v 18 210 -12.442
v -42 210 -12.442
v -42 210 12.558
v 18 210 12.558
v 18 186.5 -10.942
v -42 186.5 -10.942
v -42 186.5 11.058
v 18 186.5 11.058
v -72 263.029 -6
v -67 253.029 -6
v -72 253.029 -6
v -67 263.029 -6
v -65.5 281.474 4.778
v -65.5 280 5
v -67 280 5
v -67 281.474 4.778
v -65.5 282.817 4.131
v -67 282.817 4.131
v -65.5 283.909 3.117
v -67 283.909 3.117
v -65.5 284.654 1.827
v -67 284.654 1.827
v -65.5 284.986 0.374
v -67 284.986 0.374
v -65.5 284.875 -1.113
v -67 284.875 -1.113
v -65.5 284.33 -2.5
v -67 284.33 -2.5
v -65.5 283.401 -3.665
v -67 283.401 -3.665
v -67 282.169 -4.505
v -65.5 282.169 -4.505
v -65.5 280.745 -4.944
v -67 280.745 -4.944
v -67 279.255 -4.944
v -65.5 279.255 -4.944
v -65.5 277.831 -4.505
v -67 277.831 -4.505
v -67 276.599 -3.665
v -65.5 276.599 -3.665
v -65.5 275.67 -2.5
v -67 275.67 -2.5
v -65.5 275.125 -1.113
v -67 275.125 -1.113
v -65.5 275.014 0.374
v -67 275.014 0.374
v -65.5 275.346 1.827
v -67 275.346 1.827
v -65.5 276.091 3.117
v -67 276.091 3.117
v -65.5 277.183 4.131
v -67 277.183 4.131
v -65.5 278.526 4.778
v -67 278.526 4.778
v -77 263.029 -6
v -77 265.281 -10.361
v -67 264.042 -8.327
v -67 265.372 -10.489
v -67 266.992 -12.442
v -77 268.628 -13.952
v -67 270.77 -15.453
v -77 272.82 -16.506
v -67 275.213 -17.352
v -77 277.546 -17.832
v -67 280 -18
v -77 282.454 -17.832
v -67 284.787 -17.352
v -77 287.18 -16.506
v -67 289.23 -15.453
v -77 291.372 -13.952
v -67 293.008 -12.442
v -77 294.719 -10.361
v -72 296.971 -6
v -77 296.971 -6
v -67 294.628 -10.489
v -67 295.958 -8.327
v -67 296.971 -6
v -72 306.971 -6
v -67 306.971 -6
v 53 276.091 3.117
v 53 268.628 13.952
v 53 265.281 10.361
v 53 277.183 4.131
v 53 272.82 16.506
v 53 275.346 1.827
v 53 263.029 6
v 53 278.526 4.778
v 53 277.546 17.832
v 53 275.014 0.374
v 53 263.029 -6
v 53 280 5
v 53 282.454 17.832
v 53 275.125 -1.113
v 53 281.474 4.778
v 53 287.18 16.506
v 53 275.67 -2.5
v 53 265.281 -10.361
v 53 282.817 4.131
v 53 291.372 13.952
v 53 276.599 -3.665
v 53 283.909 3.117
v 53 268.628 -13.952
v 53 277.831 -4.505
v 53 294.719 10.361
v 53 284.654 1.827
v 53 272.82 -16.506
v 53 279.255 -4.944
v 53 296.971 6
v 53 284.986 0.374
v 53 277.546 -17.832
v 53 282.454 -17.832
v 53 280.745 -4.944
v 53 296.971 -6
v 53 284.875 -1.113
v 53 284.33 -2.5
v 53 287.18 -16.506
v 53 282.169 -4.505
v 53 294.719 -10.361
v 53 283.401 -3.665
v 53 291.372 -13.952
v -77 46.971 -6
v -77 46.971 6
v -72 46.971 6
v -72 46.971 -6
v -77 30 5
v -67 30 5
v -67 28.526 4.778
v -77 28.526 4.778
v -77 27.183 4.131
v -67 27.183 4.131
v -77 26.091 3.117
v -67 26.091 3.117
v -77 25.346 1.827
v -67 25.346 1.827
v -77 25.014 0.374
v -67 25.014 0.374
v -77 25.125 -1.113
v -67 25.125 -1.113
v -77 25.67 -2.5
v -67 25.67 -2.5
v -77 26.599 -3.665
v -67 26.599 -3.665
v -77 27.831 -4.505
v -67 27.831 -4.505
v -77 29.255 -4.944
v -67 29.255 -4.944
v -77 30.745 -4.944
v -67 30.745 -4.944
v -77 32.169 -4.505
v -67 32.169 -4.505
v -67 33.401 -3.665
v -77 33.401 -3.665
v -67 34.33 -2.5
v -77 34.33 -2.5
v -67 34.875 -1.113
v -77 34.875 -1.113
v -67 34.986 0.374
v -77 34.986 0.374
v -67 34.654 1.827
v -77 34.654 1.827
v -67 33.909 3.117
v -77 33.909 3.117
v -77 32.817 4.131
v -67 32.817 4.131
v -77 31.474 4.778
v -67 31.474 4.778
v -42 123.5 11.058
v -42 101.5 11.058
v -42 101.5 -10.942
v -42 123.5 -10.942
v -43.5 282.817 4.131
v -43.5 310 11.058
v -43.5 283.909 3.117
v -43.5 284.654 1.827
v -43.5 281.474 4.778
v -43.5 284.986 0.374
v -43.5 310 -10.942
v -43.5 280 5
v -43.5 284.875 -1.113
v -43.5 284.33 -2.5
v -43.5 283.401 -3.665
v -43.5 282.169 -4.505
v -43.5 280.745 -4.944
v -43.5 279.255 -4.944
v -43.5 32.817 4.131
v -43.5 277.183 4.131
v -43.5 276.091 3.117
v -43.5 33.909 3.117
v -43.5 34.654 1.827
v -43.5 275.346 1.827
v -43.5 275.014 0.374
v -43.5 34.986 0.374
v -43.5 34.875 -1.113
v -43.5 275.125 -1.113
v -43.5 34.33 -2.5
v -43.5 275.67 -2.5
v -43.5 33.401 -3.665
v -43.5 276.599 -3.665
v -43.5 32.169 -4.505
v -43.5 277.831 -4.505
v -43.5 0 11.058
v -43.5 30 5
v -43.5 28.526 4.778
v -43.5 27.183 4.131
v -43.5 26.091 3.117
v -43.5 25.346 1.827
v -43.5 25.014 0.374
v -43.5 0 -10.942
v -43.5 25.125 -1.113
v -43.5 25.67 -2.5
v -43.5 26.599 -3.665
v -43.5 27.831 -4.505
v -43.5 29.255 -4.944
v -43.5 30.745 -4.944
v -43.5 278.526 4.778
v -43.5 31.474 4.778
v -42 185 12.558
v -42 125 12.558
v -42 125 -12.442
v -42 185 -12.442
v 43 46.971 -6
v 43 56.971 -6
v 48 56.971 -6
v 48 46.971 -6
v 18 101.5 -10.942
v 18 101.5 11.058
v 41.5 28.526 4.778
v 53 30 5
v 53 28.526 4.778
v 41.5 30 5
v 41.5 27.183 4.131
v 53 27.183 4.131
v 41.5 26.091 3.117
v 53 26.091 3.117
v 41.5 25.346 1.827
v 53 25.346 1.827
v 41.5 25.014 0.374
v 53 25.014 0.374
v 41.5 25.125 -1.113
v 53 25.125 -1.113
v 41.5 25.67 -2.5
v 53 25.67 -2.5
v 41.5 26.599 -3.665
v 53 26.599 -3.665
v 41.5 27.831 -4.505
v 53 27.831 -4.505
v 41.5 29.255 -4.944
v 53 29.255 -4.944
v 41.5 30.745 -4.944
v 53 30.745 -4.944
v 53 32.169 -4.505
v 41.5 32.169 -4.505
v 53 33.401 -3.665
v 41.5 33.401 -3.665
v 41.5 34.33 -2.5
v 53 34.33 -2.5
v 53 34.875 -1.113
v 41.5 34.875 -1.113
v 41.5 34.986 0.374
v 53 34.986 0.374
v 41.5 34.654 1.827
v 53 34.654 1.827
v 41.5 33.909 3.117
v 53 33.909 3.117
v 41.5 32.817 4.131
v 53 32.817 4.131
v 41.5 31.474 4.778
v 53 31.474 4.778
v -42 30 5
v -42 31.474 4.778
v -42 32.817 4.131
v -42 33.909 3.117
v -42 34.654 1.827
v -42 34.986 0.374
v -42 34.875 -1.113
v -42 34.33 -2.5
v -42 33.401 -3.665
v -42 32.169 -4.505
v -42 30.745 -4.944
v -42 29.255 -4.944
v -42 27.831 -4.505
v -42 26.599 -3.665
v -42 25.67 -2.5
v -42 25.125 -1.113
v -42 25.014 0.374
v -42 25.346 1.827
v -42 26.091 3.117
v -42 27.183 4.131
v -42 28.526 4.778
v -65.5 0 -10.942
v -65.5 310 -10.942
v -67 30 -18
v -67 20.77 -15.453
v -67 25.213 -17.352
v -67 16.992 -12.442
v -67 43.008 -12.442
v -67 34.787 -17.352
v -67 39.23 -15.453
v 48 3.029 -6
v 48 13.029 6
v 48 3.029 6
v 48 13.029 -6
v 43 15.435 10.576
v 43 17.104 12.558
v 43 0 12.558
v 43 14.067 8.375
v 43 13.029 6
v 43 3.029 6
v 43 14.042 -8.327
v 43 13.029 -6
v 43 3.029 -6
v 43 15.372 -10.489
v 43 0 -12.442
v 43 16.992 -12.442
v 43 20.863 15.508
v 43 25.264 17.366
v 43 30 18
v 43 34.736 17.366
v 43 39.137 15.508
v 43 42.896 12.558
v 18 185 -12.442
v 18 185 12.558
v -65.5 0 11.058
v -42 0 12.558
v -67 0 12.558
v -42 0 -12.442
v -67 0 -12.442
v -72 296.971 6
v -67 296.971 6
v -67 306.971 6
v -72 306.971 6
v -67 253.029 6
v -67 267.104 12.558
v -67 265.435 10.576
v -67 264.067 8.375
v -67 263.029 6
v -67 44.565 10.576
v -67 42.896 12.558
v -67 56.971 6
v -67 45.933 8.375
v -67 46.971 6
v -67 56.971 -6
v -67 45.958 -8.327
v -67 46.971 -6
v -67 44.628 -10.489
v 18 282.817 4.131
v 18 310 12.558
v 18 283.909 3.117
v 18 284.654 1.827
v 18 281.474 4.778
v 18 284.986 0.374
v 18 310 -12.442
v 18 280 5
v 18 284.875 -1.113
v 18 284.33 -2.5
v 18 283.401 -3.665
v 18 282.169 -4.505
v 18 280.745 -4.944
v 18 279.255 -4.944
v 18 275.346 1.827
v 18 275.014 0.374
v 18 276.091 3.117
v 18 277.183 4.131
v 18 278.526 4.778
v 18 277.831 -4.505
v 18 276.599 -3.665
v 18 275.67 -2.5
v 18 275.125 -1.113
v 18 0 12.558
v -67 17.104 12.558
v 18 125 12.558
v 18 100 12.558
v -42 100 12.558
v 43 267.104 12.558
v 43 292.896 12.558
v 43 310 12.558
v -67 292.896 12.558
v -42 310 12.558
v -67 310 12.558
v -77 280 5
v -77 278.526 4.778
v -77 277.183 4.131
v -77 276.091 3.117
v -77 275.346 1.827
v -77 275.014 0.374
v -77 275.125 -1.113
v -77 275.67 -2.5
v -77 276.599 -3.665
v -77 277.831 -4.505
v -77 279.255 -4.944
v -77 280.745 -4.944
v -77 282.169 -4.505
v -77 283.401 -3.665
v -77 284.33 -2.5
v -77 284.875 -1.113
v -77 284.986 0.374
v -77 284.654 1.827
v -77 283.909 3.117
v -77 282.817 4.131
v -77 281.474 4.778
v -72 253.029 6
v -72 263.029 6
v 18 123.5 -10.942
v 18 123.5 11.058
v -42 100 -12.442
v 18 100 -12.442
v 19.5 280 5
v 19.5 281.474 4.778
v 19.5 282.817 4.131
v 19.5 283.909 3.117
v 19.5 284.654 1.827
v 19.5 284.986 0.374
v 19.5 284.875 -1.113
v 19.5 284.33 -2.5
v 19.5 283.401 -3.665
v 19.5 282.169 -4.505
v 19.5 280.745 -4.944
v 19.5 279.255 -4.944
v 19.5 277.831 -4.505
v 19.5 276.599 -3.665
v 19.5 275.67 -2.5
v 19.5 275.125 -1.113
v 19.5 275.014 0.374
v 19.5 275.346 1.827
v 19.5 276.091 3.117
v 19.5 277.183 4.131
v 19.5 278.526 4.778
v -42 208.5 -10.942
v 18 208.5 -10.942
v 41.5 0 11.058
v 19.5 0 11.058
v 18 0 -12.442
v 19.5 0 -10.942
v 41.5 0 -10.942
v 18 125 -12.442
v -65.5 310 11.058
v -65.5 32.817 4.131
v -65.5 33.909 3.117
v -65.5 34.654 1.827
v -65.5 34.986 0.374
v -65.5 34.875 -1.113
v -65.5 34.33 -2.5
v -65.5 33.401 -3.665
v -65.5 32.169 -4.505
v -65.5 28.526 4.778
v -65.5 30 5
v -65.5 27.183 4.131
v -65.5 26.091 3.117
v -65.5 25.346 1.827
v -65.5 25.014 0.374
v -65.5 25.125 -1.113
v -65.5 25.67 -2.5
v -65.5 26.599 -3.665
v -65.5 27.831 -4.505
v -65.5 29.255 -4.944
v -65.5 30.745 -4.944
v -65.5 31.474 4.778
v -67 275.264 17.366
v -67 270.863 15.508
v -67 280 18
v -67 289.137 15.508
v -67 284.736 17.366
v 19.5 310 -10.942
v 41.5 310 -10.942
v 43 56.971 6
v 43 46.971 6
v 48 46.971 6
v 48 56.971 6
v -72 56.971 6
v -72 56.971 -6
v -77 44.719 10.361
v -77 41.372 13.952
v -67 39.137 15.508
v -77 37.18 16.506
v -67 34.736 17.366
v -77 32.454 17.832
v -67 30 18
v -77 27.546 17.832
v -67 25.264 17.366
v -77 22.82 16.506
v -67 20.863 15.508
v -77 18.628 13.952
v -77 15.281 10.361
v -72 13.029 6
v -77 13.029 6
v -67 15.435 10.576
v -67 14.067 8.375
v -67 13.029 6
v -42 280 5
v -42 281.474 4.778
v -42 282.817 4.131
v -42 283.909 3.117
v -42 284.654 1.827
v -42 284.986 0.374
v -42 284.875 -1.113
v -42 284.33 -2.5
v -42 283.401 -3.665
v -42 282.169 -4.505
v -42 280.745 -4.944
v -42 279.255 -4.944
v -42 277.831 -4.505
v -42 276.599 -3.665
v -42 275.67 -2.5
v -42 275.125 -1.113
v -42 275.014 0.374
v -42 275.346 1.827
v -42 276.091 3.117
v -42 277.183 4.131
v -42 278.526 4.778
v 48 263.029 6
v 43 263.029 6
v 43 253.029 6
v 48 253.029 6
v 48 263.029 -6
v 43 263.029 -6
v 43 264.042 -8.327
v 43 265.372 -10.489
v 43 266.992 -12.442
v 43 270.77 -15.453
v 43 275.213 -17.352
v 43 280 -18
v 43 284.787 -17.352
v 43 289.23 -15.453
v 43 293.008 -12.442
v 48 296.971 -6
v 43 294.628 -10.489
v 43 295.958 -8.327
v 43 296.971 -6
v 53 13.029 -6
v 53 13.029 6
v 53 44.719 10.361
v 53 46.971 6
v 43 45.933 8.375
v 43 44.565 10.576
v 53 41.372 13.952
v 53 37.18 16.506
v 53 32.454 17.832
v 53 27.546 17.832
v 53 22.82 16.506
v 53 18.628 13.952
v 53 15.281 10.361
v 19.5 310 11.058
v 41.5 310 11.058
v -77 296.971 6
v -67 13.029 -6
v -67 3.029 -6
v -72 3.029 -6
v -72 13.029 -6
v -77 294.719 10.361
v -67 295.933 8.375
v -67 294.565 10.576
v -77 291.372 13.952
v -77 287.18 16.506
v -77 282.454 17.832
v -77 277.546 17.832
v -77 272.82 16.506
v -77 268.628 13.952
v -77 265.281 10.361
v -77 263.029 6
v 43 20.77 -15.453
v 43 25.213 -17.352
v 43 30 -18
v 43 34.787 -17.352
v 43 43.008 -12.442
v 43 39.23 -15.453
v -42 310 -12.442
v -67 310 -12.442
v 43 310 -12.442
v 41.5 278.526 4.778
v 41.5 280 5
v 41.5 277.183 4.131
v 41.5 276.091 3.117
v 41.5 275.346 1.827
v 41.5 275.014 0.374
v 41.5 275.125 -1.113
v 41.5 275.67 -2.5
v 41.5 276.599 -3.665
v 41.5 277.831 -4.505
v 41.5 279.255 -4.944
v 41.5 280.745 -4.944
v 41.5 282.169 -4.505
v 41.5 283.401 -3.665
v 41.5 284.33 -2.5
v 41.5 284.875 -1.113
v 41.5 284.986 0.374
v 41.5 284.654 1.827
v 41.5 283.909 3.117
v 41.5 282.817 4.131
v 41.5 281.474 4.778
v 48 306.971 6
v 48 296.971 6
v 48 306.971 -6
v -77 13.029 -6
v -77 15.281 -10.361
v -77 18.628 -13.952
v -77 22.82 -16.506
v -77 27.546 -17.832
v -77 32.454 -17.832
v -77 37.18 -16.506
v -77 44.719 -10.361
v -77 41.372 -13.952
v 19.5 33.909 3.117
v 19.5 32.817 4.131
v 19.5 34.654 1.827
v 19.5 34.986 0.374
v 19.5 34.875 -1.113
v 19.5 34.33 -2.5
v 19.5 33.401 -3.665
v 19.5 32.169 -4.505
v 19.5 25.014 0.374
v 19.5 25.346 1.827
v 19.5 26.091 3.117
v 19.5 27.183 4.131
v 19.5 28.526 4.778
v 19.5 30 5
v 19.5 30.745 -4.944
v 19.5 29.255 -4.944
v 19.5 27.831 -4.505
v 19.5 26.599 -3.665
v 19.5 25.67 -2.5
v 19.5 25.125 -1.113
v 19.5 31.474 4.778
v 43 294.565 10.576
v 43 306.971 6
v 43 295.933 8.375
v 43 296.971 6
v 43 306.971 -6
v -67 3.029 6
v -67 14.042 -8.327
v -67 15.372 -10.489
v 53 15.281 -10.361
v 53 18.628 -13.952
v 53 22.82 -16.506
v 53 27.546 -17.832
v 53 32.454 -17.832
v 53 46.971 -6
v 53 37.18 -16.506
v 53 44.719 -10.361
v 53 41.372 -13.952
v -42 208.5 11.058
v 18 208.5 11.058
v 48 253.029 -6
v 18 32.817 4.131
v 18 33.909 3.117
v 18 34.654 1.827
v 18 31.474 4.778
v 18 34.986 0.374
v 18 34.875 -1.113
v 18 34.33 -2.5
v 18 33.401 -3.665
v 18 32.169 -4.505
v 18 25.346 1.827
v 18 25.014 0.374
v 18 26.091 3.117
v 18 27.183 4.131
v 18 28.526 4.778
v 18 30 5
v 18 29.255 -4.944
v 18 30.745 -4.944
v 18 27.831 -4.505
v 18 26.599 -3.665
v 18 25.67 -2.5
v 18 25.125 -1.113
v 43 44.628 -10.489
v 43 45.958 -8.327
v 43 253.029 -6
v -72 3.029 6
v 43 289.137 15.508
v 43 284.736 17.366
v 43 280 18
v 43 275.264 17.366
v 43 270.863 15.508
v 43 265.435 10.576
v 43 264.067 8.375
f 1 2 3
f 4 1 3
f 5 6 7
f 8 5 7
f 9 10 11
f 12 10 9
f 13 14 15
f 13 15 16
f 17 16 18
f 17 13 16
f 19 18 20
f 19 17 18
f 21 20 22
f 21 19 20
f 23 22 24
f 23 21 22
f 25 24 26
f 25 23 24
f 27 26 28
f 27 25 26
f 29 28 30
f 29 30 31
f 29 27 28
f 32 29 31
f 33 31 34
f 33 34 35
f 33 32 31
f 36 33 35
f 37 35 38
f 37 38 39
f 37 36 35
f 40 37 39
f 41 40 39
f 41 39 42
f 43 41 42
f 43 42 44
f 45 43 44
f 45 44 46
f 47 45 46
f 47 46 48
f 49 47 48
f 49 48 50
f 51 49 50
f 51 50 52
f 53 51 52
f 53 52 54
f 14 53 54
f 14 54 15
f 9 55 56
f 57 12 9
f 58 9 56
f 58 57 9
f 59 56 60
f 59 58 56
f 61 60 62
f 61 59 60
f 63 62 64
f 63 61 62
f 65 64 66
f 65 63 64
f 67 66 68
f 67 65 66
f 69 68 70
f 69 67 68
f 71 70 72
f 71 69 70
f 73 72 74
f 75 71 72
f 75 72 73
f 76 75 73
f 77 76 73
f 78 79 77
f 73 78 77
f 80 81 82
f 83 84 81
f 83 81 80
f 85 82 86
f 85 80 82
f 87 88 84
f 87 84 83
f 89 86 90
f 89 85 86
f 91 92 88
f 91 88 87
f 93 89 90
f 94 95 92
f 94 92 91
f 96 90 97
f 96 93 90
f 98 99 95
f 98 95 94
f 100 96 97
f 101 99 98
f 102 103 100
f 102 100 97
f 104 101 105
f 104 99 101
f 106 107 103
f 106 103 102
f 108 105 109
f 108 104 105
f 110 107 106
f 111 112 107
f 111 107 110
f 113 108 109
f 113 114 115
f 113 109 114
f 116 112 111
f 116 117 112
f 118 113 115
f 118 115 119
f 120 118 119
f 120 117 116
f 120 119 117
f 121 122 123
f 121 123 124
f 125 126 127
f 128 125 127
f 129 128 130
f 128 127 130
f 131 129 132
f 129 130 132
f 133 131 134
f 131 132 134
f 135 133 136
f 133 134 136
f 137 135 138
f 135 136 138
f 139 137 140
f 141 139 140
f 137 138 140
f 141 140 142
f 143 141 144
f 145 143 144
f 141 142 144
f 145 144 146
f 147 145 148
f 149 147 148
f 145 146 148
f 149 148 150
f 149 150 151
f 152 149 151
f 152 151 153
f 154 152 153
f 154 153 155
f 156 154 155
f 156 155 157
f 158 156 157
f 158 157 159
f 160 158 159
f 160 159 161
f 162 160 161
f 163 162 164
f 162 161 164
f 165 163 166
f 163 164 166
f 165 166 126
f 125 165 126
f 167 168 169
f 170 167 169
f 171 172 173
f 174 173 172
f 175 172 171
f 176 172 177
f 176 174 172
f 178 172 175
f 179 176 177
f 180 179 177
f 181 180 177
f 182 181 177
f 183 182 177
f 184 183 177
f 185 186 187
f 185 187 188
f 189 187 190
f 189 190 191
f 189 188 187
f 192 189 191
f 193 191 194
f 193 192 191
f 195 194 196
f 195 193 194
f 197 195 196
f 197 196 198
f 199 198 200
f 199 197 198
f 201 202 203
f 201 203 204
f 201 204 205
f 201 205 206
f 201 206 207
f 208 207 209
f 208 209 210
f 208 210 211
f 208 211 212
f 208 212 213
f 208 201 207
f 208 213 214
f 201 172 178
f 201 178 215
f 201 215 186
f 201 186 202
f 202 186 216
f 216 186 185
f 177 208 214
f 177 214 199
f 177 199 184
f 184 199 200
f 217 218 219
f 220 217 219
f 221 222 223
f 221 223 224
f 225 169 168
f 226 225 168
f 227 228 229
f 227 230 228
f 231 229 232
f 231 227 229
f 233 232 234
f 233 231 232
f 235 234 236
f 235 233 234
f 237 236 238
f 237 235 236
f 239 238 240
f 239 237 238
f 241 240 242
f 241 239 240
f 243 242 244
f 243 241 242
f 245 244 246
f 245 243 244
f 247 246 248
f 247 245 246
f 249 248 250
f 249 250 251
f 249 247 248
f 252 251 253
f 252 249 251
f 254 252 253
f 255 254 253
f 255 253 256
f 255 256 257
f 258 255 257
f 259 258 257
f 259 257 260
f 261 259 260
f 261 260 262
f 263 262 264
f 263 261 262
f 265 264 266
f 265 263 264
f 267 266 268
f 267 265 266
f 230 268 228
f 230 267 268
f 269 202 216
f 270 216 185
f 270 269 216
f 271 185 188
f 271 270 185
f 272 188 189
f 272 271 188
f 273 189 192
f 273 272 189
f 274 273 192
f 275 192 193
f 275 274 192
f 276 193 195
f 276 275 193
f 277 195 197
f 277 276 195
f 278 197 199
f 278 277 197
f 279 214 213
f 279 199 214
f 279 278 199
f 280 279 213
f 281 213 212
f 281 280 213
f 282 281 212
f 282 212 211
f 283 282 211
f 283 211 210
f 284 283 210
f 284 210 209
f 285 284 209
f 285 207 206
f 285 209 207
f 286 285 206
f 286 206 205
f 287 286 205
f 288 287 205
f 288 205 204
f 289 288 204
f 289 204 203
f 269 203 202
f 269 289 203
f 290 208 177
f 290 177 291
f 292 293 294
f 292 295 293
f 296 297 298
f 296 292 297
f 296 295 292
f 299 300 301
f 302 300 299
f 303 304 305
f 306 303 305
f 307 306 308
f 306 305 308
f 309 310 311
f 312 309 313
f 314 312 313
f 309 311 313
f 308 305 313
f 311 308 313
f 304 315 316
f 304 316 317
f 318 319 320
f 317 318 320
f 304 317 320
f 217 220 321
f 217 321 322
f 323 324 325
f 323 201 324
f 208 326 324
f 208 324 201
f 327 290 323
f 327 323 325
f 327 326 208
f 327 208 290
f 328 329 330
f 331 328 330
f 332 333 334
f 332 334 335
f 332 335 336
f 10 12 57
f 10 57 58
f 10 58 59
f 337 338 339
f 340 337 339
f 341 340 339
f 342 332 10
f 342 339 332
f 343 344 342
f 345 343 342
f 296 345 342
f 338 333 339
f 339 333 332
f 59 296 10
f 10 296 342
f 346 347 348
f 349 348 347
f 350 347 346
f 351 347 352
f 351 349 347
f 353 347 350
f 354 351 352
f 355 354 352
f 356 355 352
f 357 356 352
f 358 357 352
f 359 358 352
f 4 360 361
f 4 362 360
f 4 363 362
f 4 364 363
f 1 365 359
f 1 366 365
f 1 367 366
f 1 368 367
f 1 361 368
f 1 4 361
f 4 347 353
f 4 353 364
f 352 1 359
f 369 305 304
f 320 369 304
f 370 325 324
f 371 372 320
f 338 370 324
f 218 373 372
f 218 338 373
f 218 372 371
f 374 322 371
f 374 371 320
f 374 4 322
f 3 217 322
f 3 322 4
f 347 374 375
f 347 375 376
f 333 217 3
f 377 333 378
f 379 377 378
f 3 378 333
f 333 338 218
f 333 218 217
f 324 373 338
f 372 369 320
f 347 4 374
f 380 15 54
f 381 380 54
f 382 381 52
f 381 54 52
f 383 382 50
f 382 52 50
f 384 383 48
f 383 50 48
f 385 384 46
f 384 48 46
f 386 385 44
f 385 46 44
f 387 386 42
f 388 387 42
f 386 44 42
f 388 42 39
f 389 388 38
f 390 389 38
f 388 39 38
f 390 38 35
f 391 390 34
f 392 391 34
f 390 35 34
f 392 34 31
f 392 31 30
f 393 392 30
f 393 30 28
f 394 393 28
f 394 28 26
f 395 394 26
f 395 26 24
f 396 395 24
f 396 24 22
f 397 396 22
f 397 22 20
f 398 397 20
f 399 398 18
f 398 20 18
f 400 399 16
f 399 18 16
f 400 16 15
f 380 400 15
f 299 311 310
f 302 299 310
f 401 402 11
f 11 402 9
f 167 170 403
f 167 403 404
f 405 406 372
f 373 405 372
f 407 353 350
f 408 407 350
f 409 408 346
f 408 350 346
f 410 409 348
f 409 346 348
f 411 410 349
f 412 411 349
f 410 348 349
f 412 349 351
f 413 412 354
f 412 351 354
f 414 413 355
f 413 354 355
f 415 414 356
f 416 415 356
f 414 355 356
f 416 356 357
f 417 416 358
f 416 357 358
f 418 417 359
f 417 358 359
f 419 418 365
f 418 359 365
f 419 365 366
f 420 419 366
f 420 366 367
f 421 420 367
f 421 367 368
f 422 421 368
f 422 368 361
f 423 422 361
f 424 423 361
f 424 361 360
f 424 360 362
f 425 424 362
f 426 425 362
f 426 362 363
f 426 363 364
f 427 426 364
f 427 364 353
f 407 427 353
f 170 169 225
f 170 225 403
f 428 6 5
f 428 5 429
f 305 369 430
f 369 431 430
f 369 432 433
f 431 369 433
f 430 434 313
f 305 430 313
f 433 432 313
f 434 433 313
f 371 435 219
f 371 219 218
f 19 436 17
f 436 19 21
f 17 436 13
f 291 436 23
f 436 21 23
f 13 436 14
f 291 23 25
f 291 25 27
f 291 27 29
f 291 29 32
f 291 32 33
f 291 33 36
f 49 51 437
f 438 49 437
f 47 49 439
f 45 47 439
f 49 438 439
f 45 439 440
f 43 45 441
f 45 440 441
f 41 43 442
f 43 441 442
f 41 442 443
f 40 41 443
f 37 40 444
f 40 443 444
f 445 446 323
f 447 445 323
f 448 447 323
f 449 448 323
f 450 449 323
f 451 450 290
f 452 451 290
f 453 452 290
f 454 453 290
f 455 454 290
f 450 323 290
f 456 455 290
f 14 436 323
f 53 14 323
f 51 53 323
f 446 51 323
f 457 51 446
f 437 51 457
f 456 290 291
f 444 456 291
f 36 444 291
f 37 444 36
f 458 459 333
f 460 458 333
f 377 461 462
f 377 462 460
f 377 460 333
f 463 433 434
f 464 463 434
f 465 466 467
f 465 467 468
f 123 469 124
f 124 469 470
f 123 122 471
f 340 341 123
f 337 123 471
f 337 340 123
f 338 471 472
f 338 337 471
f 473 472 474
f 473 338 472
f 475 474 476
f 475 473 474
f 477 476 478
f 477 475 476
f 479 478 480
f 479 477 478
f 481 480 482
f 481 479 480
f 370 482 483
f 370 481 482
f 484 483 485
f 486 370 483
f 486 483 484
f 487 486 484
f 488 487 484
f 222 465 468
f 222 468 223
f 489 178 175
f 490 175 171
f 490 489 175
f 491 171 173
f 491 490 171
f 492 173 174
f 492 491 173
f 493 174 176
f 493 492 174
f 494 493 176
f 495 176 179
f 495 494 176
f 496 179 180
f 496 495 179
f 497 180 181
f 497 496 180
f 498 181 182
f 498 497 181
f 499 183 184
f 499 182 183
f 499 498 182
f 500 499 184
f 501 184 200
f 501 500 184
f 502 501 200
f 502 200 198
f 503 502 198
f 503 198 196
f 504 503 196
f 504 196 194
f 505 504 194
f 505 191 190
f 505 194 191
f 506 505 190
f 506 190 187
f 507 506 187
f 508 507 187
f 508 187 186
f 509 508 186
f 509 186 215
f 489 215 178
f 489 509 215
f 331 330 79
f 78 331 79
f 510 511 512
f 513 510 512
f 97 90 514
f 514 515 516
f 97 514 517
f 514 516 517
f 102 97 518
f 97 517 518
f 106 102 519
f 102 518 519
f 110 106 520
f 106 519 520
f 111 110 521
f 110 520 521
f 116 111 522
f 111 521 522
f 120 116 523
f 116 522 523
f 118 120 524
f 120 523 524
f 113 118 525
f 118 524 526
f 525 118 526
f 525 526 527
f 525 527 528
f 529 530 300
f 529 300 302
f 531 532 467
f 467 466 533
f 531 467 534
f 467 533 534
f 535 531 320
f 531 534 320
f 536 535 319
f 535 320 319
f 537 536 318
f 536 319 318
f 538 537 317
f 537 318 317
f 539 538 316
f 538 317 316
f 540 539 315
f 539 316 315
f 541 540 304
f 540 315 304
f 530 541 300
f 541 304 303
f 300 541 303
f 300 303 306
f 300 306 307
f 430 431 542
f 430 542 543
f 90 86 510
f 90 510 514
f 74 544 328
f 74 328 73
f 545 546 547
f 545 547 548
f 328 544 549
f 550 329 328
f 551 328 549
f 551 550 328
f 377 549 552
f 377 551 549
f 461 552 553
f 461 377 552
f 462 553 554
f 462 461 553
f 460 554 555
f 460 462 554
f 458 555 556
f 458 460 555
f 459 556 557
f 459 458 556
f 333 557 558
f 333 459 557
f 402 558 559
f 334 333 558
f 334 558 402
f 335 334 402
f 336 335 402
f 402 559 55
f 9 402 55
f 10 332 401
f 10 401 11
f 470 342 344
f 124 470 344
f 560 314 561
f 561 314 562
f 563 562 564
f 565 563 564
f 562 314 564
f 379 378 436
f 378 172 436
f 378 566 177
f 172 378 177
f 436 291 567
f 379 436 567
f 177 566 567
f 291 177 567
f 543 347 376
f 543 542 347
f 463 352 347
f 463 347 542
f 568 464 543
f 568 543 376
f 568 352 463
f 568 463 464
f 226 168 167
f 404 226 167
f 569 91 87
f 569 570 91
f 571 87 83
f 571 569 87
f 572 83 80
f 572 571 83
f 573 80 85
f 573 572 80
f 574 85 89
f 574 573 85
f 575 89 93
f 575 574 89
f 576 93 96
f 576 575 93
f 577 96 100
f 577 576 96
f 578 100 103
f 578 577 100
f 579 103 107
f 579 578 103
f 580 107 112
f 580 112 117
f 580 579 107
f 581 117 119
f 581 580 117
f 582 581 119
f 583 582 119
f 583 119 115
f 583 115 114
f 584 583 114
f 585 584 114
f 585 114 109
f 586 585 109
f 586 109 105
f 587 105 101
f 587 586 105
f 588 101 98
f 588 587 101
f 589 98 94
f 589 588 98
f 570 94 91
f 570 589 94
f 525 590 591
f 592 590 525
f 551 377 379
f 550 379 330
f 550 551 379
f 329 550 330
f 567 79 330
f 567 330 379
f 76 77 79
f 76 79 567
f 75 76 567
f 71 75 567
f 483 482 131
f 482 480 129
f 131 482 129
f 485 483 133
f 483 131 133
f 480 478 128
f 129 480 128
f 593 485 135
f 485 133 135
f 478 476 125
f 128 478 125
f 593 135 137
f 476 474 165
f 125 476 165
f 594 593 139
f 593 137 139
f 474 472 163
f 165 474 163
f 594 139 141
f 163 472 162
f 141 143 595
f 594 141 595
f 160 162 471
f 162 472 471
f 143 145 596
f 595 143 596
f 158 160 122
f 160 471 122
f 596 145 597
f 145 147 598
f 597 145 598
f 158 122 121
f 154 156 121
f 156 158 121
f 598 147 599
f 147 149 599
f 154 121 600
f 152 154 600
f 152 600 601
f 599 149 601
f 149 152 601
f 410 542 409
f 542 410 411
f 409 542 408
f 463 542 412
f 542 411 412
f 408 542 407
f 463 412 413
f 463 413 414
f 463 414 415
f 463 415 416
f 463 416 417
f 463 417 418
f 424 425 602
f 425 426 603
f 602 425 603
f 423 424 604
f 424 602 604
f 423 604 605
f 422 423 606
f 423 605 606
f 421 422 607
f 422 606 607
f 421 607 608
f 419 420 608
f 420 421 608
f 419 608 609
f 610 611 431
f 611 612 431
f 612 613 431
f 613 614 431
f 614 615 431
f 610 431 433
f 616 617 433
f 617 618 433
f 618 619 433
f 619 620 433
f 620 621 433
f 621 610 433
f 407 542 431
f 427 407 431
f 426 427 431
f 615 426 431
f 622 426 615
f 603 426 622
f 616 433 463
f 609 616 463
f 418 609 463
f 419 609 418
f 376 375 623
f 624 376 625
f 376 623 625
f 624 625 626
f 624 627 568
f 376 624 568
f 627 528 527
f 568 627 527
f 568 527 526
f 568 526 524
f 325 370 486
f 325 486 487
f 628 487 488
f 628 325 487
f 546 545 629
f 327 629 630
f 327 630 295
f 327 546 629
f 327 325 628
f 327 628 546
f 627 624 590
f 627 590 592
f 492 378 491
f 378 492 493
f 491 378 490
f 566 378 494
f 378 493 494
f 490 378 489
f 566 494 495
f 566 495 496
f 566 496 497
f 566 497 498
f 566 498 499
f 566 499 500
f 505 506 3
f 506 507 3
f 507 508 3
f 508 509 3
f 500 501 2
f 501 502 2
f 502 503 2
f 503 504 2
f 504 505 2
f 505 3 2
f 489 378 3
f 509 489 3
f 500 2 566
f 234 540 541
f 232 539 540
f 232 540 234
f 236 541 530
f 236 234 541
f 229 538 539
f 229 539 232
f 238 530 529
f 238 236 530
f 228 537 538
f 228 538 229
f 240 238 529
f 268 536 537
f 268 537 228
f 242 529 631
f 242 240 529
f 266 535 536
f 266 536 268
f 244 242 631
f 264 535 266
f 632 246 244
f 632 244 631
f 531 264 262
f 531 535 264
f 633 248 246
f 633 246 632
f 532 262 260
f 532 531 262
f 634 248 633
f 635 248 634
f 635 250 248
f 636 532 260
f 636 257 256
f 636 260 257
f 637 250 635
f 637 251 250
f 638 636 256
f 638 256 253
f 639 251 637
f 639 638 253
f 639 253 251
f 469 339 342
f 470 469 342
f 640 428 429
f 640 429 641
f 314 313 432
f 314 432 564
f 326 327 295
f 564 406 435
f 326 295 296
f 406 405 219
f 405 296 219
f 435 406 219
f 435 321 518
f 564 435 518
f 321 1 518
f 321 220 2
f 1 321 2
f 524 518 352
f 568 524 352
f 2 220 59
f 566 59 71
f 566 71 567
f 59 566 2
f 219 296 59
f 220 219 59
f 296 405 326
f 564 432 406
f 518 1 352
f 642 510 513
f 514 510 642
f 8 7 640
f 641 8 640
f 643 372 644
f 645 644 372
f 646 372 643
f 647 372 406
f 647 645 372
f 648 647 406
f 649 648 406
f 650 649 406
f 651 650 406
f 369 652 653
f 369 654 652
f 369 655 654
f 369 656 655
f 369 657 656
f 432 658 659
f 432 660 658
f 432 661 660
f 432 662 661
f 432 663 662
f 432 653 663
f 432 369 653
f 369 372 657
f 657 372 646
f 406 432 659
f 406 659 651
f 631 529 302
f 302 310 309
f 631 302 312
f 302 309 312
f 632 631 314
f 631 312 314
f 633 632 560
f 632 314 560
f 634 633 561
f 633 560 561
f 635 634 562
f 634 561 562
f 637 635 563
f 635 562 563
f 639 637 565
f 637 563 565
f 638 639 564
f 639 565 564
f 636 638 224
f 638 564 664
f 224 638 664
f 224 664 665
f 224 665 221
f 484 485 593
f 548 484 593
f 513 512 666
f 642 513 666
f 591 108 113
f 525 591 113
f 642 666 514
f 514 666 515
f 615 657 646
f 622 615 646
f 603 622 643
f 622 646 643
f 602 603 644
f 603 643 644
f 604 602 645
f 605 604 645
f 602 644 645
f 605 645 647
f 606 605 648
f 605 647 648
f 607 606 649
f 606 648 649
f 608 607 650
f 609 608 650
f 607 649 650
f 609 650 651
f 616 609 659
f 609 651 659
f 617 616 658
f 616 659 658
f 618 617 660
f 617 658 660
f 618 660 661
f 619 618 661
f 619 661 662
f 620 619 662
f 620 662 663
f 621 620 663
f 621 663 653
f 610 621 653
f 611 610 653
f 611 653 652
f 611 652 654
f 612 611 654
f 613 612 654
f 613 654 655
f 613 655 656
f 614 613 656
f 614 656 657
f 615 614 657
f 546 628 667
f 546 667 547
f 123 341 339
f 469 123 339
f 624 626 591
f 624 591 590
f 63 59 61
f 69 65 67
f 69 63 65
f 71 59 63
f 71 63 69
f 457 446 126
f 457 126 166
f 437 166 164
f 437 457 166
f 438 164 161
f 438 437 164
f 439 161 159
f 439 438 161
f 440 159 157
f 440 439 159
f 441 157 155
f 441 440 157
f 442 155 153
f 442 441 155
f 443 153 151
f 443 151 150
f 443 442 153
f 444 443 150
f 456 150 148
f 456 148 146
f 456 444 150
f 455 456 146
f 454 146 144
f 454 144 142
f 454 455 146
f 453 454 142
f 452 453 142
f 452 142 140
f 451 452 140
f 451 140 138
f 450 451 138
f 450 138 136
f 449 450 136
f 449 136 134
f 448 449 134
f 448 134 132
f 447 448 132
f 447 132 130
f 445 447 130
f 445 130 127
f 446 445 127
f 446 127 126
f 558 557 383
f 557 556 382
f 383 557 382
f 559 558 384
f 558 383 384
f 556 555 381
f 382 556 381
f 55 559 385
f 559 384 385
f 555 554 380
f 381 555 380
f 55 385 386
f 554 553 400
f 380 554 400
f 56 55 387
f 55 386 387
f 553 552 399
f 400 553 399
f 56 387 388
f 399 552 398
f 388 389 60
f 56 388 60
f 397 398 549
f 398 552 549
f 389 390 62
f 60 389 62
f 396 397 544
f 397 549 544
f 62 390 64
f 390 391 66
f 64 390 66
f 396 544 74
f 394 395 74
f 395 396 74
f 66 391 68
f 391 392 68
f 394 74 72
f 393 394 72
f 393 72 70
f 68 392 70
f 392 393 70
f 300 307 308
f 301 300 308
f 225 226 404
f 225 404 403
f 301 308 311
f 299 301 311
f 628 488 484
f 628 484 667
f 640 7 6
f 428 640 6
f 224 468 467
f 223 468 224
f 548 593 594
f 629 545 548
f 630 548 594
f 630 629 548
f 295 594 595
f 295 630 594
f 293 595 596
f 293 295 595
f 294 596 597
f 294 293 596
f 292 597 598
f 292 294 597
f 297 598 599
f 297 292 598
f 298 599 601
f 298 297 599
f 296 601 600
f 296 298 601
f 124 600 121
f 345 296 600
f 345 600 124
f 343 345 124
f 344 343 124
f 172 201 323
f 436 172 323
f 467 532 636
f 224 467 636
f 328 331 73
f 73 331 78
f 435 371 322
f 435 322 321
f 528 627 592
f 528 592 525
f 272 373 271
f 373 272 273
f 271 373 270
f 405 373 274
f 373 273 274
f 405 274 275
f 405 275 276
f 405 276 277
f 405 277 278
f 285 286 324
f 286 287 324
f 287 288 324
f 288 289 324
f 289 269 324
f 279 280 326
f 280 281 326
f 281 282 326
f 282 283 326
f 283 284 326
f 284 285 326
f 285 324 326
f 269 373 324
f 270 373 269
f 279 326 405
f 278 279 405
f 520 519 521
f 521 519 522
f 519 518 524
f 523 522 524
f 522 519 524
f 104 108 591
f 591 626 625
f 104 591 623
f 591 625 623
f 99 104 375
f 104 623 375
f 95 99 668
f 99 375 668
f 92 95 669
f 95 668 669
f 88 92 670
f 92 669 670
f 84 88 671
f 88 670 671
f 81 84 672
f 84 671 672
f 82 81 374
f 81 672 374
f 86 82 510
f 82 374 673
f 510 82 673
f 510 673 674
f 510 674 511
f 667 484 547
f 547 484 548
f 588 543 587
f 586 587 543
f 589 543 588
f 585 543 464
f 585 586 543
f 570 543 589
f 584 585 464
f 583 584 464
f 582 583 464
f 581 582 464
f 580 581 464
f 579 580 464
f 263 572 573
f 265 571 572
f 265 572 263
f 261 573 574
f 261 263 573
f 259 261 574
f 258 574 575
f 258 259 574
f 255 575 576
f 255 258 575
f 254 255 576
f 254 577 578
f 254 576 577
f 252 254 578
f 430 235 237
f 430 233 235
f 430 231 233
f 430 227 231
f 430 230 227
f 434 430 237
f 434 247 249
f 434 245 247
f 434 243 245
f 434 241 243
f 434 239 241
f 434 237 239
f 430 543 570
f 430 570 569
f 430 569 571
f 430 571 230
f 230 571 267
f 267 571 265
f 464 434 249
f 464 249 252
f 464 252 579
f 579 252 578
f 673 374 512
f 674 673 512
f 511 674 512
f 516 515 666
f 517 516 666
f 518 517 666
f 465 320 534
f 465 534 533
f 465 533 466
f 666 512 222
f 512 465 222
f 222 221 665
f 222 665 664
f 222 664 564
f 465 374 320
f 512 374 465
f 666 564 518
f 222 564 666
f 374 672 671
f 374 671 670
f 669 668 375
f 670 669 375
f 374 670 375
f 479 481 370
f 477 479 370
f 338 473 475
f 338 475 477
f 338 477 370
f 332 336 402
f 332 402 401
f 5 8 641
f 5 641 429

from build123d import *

# Parameters (mm, degrees)
SKETCH1_W           = 25
SKETCH1_H           = 25
SKETCH1_W_2         = 22
SKETCH1_H_2         = 22
BOSS_EXTRUDE1_DEPTH = 310
SKETCH2_W           = 25
SKETCH2_H           = 25
SKETCH2_W_2         = 22
SKETCH2_H_2         = 22
BOSS_EXTRUDE2_DEPTH = 30
SKETCH8_R           = 5
CUT_EXTRUDE1_DEPTH  = 25
SKETCH9_R           = 18
SKETCH9_R_2         = 5
BOSS_EXTRUDE3_DEPTH = 10
SKETCH10_R          = 18
SKETCH10_R_2        = 5
BOSS_EXTRUDE4_DEPTH = 10
SKETCH11_W          = 12
SKETCH11_H          = 10
CUT_EXTRUDE2_DEPTH  = 5


with BuildPart() as part:
    # Sketch1 → Boss-Extrude1 (new body)
    with BuildSketch(Plane(origin=(0, 0, 0), x_dir=(1, 0, 0), z_dir=(0, 1, 0))):
        with Locations((30.5, -0.057992327)):
            Rectangle(SKETCH1_W, SKETCH1_H)
        with Locations((30.5, -0.057992327)):
            Rectangle(SKETCH1_W_2, SKETCH1_H_2, mode=Mode.SUBTRACT)
    boss_extrude1 = extrude(amount=BOSS_EXTRUDE1_DEPTH)

    # Sketch2 → Boss-Extrude2 (add)
    # profile 1 of 2: a face of its own
    with BuildSketch(Plane.ZY.offset(-18)):
        with Locations((0.057992327, 197.5)):
            Rectangle(SKETCH2_W, SKETCH2_H)
        with Locations((0.057992327, 197.5)):
            Rectangle(SKETCH2_W_2, SKETCH2_H_2, mode=Mode.SUBTRACT)
    # profile 2 of 2: a face of its own
    with BuildSketch(Plane.ZY.offset(-18)):
        with Locations((0.057992327, 112.5)):
            Rectangle(SKETCH2_W, SKETCH2_H)
        with Locations((0.057992327, 112.5)):
            Rectangle(SKETCH2_W_2, SKETCH2_H_2, mode=Mode.SUBTRACT)
    boss_extrude2 = extrude(amount=BOSS_EXTRUDE2_DEPTH)

    # Sketch8 → Cut-Extrude1 (cut)
    with BuildSketch(Plane.ZY.offset(-18)):
        with Locations((0, 280)):
            Circle(SKETCH8_R)
        with Locations((0, 30)):
            Circle(SKETCH8_R)
    cut_extrude1 = extrude(amount=-CUT_EXTRUDE1_DEPTH, mode=Mode.SUBTRACT)

    # Sketch9 → Boss-Extrude3 (add)
    # profile 1 of 3: a face of its own
    with BuildSketch(Plane(origin=(43, 0, 0), x_dir=(0, 0, -1), z_dir=(1, 0, 0))):
        with Locations((0, 30)):
            Circle(SKETCH9_R)
        with Locations(Location((0, 30, 0), (0, 0, 180))):
            Circle(SKETCH9_R_2, mode=Mode.SUBTRACT)
    # profile 2 of 3: a face of its own
    with BuildSketch(Plane(origin=(43, 0, 0), x_dir=(0, 0, -1), z_dir=(1, 0, 0))):
        with BuildLine():
            Line((-6, 13.029437252), (-6, 3.029437252))
            Line((-6, 3.029437252), (6, 3.029437252))
            Line((6, 3.029437252), (6, 13.029437252))
            ThreePointArc((6, 13.029437252), (0, 12), (-6, 13.029437252))
        make_face()
    # profile 3 of 3: a face of its own
    with BuildSketch(Plane(origin=(43, 0, 0), x_dir=(0, 0, -1), z_dir=(1, 0, 0))):
        with BuildLine():
            Line((-6, 46.970562748), (-6, 56.970562748))
            Line((-6, 56.970562748), (6, 56.970562748))
            Line((6, 56.970562748), (6, 46.970562748))
            ThreePointArc((6, 46.970562748), (0, 48), (-6, 46.970562748))
        make_face()
    boss_extrude3 = extrude(amount=BOSS_EXTRUDE3_DEPTH)

    # Sketch10 → Boss-Extrude4 (add)
    # profile 1 of 3: a face of its own
    with BuildSketch(Plane(origin=(43, 0, 0), x_dir=(0, 0, -1), z_dir=(1, 0, 0))):
        with Locations((0, 280)):
            Circle(SKETCH10_R)
        with Locations(Location((0, 280, 0), (0, 0, 180))):
            Circle(SKETCH10_R_2, mode=Mode.SUBTRACT)
    # profile 2 of 3: a face of its own
    with BuildSketch(Plane(origin=(43, 0, 0), x_dir=(0, 0, -1), z_dir=(1, 0, 0))):
        with BuildLine():
            Line((-6, 296.970562748), (-6, 306.970562748))
            Line((-6, 306.970562748), (6, 306.970562748))
            Line((6, 306.970562748), (6, 296.970562748))
            ThreePointArc((6, 296.970562748), (0, 298), (-6, 296.970562748))
        make_face()
    # profile 3 of 3: a face of its own
    with BuildSketch(Plane(origin=(43, 0, 0), x_dir=(0, 0, -1), z_dir=(1, 0, 0))):
        with BuildLine():
            Line((-6, 263.029437252), (-6, 253.029437252))
            Line((-6, 253.029437252), (6, 253.029437252))
            Line((6, 253.029437252), (6, 263.029437252))
            ThreePointArc((6, 263.029437252), (0, 262), (-6, 263.029437252))
        make_face()
    boss_extrude4 = extrude(amount=BOSS_EXTRUDE4_DEPTH)

    # Sketch11 → Cut-Extrude2 (cut)
    with BuildSketch(Plane(origin=(53, 0, 0), x_dir=(0, 0, -1), z_dir=(1, 0, 0))):
        with Locations((0, 8.029437252)):
            Rectangle(SKETCH11_W, SKETCH11_H)
        with Locations((0, 51.970562748)):
            Rectangle(SKETCH11_W, SKETCH11_H)
        with Locations((0, 258.029437252)):
            Rectangle(SKETCH11_W, SKETCH11_H)
        with Locations((0, 301.970562748)):
            Rectangle(SKETCH11_W, SKETCH11_H)
    cut_extrude2 = extrude(amount=-CUT_EXTRUDE2_DEPTH, mode=Mode.SUBTRACT)

    # Mirror1: Boss-Extrude1, Boss-Extrude2, Cut-Extrude1, Boss-Extrude3, Boss-Extrude4, Cut-Extrude2 across plane
    add(boss_extrude1.mirror(Plane.ZY.offset(12)))
    add(boss_extrude2.mirror(Plane.ZY.offset(12)))
    add(cut_extrude1.mirror(Plane.ZY.offset(12)), mode=Mode.SUBTRACT)
    add(boss_extrude3.mirror(Plane.ZY.offset(12)))
    add(boss_extrude4.mirror(Plane.ZY.offset(12)))
    add(cut_extrude2.mirror(Plane.ZY.offset(12)), mode=Mode.SUBTRACT)


solid = part.part
